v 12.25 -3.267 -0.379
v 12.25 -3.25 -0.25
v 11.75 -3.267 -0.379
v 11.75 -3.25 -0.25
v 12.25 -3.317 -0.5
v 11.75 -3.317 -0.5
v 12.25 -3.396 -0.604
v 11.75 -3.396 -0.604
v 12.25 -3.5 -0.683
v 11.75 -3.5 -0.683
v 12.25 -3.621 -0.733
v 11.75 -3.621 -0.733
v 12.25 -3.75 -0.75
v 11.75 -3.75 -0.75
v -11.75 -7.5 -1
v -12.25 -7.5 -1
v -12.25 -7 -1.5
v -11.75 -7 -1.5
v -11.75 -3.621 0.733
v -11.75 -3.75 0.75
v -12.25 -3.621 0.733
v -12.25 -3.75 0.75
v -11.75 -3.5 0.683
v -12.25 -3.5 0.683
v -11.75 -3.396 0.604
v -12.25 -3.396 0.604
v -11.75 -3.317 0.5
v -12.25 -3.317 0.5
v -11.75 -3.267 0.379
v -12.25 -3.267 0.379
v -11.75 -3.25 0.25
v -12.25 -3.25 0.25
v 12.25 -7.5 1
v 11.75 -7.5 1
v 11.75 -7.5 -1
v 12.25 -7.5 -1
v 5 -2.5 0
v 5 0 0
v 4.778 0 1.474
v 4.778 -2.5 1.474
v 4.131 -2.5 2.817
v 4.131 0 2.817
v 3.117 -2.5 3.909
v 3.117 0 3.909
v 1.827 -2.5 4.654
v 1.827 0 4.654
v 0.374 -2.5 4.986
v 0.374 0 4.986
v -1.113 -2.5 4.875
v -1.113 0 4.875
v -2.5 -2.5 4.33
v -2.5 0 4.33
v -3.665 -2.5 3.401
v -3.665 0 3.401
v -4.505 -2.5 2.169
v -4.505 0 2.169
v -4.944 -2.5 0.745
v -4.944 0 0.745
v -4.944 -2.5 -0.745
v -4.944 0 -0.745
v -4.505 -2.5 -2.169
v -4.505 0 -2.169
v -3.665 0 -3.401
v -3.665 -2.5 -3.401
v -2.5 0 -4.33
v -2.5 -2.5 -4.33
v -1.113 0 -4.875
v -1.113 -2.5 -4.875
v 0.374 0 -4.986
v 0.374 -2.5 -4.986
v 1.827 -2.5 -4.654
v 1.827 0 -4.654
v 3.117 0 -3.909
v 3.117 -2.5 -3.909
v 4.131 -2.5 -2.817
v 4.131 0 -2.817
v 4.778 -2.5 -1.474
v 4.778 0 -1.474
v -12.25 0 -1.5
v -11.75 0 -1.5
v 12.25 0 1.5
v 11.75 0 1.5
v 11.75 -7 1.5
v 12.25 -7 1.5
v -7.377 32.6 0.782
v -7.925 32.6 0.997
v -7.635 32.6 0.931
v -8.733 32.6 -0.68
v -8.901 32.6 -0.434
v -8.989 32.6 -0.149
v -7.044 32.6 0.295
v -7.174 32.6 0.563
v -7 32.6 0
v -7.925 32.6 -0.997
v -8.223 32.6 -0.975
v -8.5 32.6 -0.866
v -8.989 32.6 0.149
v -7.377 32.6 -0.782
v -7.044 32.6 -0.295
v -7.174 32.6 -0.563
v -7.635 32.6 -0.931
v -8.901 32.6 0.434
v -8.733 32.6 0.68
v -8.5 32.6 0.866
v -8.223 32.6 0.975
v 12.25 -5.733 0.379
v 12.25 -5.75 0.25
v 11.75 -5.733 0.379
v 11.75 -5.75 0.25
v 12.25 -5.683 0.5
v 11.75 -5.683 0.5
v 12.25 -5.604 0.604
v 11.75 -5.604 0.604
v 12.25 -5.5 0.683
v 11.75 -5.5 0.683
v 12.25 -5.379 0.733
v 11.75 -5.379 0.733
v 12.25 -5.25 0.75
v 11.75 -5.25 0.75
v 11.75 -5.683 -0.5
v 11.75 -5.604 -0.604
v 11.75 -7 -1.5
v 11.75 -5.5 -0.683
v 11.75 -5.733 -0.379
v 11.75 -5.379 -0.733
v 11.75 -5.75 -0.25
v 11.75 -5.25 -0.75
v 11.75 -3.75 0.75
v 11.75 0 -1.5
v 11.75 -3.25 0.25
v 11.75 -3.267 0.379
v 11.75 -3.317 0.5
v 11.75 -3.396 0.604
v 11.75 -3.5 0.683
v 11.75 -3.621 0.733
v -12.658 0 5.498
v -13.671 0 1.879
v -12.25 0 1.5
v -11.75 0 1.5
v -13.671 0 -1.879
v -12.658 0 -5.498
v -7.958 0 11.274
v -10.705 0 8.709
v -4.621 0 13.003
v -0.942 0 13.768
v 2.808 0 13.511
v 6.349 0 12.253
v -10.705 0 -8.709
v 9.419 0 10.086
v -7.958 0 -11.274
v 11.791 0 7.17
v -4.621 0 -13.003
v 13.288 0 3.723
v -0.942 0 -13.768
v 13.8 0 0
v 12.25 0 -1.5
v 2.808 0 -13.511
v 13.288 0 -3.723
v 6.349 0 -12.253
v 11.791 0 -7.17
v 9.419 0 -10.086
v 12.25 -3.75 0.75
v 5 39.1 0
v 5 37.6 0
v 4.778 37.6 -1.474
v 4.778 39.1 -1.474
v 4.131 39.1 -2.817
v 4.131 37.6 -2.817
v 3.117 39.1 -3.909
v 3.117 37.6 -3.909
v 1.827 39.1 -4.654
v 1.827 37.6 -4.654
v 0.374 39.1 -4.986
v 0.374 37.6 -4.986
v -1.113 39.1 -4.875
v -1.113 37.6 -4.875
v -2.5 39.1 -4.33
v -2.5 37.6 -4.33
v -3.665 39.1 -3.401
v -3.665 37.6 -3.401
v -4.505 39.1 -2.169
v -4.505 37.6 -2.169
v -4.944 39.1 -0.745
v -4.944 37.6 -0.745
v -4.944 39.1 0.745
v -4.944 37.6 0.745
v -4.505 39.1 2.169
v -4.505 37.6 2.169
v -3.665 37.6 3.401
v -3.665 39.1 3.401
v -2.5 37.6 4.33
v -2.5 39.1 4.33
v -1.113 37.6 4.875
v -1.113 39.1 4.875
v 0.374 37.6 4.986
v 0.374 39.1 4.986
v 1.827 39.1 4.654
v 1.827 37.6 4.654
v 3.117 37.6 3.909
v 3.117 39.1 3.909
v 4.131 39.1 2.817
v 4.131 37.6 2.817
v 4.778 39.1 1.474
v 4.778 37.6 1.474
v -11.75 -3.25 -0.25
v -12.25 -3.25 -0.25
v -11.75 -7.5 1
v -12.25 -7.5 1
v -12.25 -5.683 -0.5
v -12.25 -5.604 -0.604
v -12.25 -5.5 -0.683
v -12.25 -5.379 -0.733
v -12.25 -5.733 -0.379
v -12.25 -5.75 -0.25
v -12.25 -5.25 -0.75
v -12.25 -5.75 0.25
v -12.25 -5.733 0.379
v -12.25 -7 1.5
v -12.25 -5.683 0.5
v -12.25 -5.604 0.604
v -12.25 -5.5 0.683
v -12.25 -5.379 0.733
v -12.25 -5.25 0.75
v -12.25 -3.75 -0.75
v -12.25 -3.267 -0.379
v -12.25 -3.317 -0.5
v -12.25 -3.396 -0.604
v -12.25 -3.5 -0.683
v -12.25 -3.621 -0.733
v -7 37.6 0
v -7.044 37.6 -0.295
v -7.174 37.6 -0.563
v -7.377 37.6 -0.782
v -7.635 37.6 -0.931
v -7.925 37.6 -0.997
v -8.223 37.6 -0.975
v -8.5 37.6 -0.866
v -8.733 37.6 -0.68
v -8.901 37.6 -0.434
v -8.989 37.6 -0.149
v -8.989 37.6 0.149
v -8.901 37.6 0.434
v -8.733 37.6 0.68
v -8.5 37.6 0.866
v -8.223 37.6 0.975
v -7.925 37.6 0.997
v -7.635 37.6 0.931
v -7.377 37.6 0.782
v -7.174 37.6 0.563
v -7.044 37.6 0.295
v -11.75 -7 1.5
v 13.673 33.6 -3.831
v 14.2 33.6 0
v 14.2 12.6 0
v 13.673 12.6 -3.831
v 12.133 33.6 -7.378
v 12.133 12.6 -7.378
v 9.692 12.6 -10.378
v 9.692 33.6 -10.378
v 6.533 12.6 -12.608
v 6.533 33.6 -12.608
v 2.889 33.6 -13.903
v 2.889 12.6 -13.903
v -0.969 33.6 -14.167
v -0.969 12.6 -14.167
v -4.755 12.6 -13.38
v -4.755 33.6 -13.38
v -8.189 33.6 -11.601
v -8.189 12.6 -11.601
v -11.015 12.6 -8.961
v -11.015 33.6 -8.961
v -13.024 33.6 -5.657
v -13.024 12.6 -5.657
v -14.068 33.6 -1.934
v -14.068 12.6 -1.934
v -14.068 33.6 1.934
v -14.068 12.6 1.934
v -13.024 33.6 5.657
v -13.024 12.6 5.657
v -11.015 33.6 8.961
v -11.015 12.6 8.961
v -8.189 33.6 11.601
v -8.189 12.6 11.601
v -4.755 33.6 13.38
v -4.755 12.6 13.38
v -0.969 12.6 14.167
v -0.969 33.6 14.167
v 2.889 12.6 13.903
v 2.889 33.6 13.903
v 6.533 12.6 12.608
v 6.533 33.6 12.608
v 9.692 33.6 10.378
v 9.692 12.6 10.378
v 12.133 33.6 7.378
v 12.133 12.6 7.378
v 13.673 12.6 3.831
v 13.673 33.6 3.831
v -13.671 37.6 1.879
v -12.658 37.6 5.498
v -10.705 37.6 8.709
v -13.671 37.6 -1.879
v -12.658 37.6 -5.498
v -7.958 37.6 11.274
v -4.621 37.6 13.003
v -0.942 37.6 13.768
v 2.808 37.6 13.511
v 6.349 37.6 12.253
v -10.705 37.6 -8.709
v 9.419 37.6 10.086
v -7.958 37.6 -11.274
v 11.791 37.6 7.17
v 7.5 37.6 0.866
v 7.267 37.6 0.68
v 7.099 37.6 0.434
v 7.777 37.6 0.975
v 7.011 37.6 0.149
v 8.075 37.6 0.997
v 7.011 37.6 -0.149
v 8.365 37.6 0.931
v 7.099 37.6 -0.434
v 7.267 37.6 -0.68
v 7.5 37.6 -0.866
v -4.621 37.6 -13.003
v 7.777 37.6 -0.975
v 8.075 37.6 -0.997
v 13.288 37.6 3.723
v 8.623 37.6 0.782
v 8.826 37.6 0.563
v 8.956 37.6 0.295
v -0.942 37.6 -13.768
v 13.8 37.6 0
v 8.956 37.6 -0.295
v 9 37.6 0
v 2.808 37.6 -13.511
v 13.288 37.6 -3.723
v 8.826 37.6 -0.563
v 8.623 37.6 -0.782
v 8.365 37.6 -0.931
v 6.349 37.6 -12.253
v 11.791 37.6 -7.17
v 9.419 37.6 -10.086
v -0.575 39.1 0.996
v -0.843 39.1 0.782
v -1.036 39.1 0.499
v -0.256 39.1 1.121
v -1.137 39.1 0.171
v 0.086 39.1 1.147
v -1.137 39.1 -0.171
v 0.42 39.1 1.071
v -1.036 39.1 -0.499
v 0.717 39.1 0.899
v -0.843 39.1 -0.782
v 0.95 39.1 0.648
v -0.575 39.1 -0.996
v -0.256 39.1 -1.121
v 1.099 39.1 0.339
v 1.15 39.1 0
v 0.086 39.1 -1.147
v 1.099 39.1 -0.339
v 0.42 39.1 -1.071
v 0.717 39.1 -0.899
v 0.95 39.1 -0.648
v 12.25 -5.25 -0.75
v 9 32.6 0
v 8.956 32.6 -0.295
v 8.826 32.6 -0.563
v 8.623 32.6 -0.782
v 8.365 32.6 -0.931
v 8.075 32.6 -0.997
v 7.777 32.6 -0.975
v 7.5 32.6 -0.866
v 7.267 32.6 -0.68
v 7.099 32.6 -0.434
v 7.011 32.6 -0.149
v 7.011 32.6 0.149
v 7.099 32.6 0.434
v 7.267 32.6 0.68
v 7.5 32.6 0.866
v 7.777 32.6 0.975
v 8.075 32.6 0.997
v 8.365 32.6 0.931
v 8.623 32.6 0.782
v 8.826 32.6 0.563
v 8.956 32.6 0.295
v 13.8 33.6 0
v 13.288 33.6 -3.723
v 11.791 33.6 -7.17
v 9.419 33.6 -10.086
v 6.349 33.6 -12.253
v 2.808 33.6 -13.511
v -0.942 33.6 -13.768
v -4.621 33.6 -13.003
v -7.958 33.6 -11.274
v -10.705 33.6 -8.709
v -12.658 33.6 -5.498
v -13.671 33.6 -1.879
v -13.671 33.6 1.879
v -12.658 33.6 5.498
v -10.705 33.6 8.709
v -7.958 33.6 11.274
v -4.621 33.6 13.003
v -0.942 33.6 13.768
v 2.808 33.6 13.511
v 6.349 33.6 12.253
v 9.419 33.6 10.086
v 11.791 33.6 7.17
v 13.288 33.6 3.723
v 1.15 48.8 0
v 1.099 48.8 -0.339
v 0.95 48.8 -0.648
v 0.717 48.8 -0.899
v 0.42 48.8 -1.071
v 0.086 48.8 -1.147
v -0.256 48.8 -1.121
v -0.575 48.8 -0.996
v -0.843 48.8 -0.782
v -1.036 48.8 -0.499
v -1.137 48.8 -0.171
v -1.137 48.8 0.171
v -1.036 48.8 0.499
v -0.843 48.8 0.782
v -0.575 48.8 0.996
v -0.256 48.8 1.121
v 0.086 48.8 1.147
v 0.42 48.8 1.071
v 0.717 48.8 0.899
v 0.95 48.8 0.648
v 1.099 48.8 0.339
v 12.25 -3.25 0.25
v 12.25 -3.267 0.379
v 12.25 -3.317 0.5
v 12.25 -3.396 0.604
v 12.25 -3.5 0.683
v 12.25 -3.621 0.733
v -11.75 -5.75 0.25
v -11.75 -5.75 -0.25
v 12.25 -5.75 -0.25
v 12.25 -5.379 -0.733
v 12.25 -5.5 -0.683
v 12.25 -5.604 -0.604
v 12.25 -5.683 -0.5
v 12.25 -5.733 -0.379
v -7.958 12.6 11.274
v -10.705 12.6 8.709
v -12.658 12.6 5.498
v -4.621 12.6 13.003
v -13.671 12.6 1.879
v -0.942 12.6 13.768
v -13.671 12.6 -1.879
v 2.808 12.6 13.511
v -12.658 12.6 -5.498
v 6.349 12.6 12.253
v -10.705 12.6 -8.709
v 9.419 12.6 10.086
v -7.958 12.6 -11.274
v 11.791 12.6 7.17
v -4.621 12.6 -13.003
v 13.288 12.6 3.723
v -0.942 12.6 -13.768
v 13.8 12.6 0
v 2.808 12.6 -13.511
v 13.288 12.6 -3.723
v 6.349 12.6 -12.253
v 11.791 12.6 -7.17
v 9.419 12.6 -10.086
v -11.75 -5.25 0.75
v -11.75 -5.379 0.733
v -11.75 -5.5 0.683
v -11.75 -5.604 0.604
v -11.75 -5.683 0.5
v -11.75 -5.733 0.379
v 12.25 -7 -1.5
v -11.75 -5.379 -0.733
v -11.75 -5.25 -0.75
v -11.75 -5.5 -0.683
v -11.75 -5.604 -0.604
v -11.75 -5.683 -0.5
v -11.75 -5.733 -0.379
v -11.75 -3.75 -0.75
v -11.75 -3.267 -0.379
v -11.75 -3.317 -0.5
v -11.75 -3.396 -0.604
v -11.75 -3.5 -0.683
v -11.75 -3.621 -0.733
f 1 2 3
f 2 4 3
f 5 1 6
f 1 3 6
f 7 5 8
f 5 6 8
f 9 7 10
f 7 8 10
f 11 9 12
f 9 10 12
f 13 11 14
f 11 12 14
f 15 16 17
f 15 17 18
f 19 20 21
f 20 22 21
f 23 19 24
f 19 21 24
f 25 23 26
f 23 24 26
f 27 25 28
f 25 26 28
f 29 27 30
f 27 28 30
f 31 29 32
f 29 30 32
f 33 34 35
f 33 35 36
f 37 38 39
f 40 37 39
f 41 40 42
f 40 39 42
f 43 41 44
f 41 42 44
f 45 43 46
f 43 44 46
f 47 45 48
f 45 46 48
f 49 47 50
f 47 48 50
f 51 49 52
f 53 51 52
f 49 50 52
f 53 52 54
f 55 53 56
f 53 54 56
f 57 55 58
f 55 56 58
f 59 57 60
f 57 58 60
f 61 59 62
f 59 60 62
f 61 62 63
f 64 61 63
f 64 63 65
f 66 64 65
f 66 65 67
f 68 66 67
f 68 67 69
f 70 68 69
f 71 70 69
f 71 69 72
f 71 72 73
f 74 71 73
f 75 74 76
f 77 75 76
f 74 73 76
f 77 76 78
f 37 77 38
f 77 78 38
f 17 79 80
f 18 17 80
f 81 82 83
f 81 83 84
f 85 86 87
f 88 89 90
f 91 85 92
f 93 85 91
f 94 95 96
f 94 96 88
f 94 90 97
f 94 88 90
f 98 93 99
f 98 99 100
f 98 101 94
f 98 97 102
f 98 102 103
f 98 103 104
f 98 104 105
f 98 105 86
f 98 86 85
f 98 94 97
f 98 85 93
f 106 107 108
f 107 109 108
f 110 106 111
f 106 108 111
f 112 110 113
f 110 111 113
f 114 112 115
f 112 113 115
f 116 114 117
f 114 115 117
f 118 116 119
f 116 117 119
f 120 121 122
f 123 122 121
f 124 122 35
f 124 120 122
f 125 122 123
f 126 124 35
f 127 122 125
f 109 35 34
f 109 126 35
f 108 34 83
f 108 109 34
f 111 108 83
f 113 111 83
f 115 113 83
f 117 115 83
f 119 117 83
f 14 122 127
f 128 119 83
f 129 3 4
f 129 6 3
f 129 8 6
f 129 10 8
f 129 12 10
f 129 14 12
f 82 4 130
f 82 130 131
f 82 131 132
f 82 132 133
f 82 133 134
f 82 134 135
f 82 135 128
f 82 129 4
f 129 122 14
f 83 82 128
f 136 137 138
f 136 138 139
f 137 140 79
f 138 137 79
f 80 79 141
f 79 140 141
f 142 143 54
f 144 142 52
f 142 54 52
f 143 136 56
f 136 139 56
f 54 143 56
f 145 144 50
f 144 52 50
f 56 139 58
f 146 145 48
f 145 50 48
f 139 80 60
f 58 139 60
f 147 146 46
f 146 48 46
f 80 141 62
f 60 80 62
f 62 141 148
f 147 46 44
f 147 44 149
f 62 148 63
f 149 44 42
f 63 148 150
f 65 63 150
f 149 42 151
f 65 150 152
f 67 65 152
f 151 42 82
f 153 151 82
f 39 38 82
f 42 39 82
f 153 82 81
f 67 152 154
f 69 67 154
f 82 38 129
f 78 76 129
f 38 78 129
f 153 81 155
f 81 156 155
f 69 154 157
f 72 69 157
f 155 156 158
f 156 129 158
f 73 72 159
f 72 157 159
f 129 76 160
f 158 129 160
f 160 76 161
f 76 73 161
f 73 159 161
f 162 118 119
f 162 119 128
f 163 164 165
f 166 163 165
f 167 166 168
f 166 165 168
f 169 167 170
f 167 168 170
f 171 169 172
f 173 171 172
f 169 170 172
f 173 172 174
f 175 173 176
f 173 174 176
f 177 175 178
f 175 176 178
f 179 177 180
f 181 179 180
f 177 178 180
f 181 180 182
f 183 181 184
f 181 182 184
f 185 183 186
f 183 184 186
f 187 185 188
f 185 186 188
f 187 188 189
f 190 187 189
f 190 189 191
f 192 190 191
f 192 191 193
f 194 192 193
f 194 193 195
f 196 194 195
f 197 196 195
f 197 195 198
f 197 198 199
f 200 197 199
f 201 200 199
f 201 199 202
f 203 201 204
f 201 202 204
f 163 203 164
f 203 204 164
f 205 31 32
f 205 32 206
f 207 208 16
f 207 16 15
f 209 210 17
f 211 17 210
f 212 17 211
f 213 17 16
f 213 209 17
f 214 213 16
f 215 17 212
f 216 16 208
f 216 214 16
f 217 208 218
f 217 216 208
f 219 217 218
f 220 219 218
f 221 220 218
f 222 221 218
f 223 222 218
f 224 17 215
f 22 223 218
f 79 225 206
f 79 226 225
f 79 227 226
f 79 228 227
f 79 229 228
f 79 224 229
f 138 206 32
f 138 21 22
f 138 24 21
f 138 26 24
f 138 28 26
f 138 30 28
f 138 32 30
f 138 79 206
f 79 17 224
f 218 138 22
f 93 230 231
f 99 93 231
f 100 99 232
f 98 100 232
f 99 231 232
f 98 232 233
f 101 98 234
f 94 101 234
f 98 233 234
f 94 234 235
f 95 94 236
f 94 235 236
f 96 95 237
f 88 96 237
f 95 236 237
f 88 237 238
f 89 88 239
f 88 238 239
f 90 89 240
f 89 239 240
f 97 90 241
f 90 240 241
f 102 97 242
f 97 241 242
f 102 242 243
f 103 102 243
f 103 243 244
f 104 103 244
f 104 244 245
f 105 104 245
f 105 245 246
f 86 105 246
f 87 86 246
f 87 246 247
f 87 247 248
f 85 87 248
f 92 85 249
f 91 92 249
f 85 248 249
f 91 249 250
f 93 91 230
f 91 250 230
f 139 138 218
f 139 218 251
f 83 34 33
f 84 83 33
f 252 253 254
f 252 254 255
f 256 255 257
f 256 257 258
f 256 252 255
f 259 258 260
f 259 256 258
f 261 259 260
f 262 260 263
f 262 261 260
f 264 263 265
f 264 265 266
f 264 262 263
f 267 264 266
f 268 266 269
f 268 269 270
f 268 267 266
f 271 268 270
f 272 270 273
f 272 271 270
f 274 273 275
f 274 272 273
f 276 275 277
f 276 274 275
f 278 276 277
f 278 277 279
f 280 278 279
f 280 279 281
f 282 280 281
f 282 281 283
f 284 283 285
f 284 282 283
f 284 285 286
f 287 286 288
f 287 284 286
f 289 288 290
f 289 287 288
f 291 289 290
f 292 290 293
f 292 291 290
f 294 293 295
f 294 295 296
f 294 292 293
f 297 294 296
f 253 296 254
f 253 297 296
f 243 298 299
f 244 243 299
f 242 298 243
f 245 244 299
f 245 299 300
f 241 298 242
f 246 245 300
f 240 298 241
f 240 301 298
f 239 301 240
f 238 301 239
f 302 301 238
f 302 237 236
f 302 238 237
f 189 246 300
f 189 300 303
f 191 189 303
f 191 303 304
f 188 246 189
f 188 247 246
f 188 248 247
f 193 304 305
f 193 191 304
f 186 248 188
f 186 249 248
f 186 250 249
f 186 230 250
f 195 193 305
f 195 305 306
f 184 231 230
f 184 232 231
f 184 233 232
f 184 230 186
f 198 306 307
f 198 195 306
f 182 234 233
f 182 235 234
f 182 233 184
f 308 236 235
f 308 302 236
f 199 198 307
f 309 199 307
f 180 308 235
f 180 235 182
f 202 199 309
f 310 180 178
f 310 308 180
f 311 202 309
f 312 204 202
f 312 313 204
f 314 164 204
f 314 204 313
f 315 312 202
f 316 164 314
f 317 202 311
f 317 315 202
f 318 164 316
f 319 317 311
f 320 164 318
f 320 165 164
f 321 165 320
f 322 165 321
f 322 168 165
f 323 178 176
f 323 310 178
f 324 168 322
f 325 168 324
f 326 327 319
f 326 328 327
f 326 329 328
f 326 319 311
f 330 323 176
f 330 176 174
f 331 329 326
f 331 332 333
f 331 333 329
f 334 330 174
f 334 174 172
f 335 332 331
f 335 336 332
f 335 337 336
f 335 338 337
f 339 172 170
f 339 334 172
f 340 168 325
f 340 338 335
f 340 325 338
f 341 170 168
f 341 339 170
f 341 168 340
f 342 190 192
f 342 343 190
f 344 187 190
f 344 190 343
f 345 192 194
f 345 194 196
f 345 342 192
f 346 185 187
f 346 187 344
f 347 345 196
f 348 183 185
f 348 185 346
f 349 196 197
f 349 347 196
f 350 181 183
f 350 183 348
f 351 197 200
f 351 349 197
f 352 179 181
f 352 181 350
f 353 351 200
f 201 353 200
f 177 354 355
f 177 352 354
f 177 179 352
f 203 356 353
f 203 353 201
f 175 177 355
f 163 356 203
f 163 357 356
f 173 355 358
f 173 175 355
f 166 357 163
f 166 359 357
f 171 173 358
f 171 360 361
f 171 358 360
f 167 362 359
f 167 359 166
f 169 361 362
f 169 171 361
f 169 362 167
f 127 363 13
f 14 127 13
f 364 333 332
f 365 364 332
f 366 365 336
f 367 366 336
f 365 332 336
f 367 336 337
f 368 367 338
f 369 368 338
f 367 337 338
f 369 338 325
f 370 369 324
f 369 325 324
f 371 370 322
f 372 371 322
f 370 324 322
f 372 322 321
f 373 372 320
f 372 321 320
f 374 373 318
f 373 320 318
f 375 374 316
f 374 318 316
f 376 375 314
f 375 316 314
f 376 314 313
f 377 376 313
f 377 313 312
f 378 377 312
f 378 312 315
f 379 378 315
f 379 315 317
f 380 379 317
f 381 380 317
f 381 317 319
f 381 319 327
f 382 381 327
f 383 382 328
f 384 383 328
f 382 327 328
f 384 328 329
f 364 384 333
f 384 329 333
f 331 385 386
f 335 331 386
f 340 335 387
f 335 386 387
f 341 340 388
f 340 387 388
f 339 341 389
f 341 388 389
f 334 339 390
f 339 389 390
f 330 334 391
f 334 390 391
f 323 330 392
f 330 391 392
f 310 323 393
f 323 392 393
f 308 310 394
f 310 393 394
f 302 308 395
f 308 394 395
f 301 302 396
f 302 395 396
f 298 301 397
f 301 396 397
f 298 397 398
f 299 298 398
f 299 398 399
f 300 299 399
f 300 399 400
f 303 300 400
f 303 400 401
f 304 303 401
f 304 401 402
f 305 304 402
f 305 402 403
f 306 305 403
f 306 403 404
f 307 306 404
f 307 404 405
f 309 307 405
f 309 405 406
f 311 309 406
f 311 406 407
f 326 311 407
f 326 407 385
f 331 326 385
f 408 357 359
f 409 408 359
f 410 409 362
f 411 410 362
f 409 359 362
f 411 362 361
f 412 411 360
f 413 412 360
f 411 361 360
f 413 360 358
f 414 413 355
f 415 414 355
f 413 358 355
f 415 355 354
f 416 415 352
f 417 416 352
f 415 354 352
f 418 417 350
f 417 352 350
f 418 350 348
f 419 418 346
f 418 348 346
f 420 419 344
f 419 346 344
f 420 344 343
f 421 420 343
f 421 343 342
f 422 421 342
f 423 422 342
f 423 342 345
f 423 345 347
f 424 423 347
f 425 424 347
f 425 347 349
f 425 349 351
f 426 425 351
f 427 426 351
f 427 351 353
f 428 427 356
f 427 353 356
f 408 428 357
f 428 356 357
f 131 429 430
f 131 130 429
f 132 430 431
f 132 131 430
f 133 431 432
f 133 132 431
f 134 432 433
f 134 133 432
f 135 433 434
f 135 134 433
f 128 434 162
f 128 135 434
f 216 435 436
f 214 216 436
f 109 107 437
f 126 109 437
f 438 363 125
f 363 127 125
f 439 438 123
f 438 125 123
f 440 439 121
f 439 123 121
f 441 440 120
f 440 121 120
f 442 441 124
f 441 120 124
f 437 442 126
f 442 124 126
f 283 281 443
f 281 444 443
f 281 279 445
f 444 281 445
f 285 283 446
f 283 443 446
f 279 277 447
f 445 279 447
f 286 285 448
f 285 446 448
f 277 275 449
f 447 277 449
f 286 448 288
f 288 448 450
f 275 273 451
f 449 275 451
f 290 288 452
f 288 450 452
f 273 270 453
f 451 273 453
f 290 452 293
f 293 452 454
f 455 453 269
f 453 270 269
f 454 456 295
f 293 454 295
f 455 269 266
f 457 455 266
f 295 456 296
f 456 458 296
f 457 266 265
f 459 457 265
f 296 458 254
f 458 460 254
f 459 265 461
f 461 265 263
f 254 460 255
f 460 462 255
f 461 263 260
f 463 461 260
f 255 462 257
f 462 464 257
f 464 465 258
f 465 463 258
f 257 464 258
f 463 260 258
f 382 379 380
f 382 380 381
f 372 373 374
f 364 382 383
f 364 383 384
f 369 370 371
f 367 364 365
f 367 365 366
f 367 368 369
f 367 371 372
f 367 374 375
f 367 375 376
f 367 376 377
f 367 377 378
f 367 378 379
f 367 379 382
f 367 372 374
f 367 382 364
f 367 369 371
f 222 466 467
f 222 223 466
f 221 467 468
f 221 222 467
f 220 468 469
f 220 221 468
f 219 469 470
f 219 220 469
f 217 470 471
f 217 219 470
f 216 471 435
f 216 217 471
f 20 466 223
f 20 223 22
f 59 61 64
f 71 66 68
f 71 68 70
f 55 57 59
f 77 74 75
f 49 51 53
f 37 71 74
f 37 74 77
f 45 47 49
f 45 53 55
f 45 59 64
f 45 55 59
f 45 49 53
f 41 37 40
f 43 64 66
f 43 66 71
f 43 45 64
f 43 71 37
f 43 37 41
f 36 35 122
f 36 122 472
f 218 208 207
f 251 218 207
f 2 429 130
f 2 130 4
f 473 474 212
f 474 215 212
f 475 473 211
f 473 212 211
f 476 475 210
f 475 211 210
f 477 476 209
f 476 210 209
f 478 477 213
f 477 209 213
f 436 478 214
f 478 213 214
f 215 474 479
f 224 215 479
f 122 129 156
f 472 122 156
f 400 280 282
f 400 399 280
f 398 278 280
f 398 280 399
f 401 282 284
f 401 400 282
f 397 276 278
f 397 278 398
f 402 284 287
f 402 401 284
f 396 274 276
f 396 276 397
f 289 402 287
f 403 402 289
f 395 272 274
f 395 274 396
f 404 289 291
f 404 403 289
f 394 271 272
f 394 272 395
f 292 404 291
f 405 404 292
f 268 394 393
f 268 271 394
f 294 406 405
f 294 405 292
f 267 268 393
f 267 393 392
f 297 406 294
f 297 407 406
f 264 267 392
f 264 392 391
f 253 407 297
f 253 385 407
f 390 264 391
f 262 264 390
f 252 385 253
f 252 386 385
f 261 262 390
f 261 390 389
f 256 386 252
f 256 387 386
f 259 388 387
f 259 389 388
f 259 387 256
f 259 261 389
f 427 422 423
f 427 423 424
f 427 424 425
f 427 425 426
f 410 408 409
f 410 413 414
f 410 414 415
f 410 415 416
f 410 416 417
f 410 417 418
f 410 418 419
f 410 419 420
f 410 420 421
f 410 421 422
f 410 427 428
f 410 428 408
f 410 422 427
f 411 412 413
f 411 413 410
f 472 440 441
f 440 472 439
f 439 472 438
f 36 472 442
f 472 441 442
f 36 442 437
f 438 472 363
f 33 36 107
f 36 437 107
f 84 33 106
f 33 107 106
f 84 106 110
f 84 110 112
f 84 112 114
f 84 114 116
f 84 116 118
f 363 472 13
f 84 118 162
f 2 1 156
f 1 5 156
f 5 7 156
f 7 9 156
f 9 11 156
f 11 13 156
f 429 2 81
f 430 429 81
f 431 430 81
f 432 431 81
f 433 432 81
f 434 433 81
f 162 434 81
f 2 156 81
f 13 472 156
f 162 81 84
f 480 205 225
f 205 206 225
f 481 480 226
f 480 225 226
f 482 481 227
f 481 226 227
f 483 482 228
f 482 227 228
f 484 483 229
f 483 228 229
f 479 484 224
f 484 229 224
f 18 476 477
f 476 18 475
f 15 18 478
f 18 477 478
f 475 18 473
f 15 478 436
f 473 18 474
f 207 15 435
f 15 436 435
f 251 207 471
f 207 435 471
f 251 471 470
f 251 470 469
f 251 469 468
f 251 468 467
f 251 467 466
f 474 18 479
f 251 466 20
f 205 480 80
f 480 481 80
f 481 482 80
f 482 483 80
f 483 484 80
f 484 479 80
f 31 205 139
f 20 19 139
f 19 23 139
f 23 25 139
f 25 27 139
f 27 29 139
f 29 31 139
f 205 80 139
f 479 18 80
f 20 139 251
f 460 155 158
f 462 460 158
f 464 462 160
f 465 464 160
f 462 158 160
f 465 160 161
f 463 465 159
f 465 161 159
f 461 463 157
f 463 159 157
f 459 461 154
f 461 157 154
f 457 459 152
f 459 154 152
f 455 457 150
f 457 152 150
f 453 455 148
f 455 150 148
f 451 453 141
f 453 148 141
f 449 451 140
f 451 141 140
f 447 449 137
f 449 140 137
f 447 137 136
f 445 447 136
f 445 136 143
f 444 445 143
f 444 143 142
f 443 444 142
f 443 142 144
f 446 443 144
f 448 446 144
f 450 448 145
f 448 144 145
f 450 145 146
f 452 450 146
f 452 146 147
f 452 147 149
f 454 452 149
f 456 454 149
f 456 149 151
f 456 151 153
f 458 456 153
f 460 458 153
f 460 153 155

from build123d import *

# Parameters (mm, degrees)
SKETCH1_R           = 13.8
BOSS_EXTRUDE1_DEPTH = 37.6
SKETCH2_R           = 5
BOSS_EXTRUDE2_DEPTH = 1.5
SKETCH3_R           = 1.15
BOSS_EXTRUDE3_DEPTH = 9.7
SKETCH4_R           = 1
CUT_EXTRUDE1_DEPTH  = 5
SKETCH5_R           = 5
BOSS_EXTRUDE4_DEPTH = 2.5
SKETCH6_W           = 0.5
SKETCH6_H           = 3
BOSS_EXTRUDE5_DEPTH = 7.5
SKETCH7_W           = 1.5
SKETCH7_H           = 2.5
CUT_EXTRUDE2_DEPTH  = 24.5
CHAMFER1_SIZE       = 0.5
FILLET1_R           = 0.5
SKETCH8_R           = 14.2
SKETCH8_R_2         = 13.8
BOSS_EXTRUDE6_DEPTH = 21


with BuildPart() as part:
    # Sketch1 → Boss-Extrude1 (new body)
    with BuildSketch(Plane(origin=(0, 0, 0), x_dir=(1, 0, 0), z_dir=(0, 1, 0))):
        Circle(SKETCH1_R)
    extrude(amount=BOSS_EXTRUDE1_DEPTH)

    # Sketch2 → Boss-Extrude2 (add)
    with BuildSketch(Plane(origin=(0, 37.6, 0), x_dir=(1, 0, 0), z_dir=(0, 1, 0))):
        Circle(SKETCH2_R)
    extrude(amount=BOSS_EXTRUDE2_DEPTH)

    # Sketch3 → Boss-Extrude3 (add)
    with BuildSketch(Plane(origin=(0, 39.1, 0), x_dir=(1, 0, 0), z_dir=(0, 1, 0))):
        Circle(SKETCH3_R)
    extrude(amount=BOSS_EXTRUDE3_DEPTH)

    # Sketch4 → Cut-Extrude1 (cut)
    with BuildSketch(Plane(origin=(0, 37.6, 0), x_dir=(1, 0, 0), z_dir=(0, 1, 0))):
        with Locations((8, 0)):
            Circle(SKETCH4_R)
        with Locations((-8, 0)):
            Circle(SKETCH4_R)
    extrude(amount=-CUT_EXTRUDE1_DEPTH, mode=Mode.SUBTRACT)

    # Sketch5 → Boss-Extrude4 (add)
    with BuildSketch(Plane.XZ):
        Circle(SKETCH5_R)
    extrude(amount=BOSS_EXTRUDE4_DEPTH)

    # Sketch6 → Boss-Extrude5 (add)
    with BuildSketch(Plane.XZ):
        with Locations((12, 0)):
            Rectangle(SKETCH6_W, SKETCH6_H)
        with Locations((-12, 0)):
            Rectangle(SKETCH6_W, SKETCH6_H)
    extrude(amount=BOSS_EXTRUDE5_DEPTH)

    # Sketch7 → Cut-Extrude2 (cut)
    with BuildSketch(Plane(origin=(12.25, 0, 0), x_dir=(0, 0, -1), z_dir=(1, 0, 0))):
        with Locations((0, -4.5)):
            Rectangle(SKETCH7_W, SKETCH7_H)
    extrude(amount=-CUT_EXTRUDE2_DEPTH, mode=Mode.SUBTRACT)

    # Chamfer1
    chamfer1_edges = [part.edges().sort_by_distance(p)[0] for p in [
        (12, -7.5, 1.5),
        (12, -7.5, -1.5),
        (-12, -7.5, 1.5),
        (-12, -7.5, -1.5),
    ]]
    chamfer(chamfer1_edges, length=CHAMFER1_SIZE)

    # Fillet1
    fillet1_edges = [part.edges().sort_by_distance(p)[0] for p in [
        (12, -3.25, -0.75),
        (-12, -3.25, -0.75),
        (12, -5.75, -0.75),
        (-12, -5.75, -0.75),
        (12, -5.75, 0.75),
        (-12, -5.75, 0.75),
        (12, -3.25, 0.75),
        (-12, -3.25, 0.75),
    ]]
    fillet(fillet1_edges, radius=FILLET1_R)

    # Sketch8 → Boss-Extrude6 (add)
    with BuildSketch(Plane(origin=(0, 33.6, 0), x_dir=(1, 0, 0), z_dir=(0, 1, 0))):
        Circle(SKETCH8_R)
        Circle(SKETCH8_R_2, mode=Mode.SUBTRACT)
    extrude(amount=-BOSS_EXTRUDE6_DEPTH)


solid = part.part
